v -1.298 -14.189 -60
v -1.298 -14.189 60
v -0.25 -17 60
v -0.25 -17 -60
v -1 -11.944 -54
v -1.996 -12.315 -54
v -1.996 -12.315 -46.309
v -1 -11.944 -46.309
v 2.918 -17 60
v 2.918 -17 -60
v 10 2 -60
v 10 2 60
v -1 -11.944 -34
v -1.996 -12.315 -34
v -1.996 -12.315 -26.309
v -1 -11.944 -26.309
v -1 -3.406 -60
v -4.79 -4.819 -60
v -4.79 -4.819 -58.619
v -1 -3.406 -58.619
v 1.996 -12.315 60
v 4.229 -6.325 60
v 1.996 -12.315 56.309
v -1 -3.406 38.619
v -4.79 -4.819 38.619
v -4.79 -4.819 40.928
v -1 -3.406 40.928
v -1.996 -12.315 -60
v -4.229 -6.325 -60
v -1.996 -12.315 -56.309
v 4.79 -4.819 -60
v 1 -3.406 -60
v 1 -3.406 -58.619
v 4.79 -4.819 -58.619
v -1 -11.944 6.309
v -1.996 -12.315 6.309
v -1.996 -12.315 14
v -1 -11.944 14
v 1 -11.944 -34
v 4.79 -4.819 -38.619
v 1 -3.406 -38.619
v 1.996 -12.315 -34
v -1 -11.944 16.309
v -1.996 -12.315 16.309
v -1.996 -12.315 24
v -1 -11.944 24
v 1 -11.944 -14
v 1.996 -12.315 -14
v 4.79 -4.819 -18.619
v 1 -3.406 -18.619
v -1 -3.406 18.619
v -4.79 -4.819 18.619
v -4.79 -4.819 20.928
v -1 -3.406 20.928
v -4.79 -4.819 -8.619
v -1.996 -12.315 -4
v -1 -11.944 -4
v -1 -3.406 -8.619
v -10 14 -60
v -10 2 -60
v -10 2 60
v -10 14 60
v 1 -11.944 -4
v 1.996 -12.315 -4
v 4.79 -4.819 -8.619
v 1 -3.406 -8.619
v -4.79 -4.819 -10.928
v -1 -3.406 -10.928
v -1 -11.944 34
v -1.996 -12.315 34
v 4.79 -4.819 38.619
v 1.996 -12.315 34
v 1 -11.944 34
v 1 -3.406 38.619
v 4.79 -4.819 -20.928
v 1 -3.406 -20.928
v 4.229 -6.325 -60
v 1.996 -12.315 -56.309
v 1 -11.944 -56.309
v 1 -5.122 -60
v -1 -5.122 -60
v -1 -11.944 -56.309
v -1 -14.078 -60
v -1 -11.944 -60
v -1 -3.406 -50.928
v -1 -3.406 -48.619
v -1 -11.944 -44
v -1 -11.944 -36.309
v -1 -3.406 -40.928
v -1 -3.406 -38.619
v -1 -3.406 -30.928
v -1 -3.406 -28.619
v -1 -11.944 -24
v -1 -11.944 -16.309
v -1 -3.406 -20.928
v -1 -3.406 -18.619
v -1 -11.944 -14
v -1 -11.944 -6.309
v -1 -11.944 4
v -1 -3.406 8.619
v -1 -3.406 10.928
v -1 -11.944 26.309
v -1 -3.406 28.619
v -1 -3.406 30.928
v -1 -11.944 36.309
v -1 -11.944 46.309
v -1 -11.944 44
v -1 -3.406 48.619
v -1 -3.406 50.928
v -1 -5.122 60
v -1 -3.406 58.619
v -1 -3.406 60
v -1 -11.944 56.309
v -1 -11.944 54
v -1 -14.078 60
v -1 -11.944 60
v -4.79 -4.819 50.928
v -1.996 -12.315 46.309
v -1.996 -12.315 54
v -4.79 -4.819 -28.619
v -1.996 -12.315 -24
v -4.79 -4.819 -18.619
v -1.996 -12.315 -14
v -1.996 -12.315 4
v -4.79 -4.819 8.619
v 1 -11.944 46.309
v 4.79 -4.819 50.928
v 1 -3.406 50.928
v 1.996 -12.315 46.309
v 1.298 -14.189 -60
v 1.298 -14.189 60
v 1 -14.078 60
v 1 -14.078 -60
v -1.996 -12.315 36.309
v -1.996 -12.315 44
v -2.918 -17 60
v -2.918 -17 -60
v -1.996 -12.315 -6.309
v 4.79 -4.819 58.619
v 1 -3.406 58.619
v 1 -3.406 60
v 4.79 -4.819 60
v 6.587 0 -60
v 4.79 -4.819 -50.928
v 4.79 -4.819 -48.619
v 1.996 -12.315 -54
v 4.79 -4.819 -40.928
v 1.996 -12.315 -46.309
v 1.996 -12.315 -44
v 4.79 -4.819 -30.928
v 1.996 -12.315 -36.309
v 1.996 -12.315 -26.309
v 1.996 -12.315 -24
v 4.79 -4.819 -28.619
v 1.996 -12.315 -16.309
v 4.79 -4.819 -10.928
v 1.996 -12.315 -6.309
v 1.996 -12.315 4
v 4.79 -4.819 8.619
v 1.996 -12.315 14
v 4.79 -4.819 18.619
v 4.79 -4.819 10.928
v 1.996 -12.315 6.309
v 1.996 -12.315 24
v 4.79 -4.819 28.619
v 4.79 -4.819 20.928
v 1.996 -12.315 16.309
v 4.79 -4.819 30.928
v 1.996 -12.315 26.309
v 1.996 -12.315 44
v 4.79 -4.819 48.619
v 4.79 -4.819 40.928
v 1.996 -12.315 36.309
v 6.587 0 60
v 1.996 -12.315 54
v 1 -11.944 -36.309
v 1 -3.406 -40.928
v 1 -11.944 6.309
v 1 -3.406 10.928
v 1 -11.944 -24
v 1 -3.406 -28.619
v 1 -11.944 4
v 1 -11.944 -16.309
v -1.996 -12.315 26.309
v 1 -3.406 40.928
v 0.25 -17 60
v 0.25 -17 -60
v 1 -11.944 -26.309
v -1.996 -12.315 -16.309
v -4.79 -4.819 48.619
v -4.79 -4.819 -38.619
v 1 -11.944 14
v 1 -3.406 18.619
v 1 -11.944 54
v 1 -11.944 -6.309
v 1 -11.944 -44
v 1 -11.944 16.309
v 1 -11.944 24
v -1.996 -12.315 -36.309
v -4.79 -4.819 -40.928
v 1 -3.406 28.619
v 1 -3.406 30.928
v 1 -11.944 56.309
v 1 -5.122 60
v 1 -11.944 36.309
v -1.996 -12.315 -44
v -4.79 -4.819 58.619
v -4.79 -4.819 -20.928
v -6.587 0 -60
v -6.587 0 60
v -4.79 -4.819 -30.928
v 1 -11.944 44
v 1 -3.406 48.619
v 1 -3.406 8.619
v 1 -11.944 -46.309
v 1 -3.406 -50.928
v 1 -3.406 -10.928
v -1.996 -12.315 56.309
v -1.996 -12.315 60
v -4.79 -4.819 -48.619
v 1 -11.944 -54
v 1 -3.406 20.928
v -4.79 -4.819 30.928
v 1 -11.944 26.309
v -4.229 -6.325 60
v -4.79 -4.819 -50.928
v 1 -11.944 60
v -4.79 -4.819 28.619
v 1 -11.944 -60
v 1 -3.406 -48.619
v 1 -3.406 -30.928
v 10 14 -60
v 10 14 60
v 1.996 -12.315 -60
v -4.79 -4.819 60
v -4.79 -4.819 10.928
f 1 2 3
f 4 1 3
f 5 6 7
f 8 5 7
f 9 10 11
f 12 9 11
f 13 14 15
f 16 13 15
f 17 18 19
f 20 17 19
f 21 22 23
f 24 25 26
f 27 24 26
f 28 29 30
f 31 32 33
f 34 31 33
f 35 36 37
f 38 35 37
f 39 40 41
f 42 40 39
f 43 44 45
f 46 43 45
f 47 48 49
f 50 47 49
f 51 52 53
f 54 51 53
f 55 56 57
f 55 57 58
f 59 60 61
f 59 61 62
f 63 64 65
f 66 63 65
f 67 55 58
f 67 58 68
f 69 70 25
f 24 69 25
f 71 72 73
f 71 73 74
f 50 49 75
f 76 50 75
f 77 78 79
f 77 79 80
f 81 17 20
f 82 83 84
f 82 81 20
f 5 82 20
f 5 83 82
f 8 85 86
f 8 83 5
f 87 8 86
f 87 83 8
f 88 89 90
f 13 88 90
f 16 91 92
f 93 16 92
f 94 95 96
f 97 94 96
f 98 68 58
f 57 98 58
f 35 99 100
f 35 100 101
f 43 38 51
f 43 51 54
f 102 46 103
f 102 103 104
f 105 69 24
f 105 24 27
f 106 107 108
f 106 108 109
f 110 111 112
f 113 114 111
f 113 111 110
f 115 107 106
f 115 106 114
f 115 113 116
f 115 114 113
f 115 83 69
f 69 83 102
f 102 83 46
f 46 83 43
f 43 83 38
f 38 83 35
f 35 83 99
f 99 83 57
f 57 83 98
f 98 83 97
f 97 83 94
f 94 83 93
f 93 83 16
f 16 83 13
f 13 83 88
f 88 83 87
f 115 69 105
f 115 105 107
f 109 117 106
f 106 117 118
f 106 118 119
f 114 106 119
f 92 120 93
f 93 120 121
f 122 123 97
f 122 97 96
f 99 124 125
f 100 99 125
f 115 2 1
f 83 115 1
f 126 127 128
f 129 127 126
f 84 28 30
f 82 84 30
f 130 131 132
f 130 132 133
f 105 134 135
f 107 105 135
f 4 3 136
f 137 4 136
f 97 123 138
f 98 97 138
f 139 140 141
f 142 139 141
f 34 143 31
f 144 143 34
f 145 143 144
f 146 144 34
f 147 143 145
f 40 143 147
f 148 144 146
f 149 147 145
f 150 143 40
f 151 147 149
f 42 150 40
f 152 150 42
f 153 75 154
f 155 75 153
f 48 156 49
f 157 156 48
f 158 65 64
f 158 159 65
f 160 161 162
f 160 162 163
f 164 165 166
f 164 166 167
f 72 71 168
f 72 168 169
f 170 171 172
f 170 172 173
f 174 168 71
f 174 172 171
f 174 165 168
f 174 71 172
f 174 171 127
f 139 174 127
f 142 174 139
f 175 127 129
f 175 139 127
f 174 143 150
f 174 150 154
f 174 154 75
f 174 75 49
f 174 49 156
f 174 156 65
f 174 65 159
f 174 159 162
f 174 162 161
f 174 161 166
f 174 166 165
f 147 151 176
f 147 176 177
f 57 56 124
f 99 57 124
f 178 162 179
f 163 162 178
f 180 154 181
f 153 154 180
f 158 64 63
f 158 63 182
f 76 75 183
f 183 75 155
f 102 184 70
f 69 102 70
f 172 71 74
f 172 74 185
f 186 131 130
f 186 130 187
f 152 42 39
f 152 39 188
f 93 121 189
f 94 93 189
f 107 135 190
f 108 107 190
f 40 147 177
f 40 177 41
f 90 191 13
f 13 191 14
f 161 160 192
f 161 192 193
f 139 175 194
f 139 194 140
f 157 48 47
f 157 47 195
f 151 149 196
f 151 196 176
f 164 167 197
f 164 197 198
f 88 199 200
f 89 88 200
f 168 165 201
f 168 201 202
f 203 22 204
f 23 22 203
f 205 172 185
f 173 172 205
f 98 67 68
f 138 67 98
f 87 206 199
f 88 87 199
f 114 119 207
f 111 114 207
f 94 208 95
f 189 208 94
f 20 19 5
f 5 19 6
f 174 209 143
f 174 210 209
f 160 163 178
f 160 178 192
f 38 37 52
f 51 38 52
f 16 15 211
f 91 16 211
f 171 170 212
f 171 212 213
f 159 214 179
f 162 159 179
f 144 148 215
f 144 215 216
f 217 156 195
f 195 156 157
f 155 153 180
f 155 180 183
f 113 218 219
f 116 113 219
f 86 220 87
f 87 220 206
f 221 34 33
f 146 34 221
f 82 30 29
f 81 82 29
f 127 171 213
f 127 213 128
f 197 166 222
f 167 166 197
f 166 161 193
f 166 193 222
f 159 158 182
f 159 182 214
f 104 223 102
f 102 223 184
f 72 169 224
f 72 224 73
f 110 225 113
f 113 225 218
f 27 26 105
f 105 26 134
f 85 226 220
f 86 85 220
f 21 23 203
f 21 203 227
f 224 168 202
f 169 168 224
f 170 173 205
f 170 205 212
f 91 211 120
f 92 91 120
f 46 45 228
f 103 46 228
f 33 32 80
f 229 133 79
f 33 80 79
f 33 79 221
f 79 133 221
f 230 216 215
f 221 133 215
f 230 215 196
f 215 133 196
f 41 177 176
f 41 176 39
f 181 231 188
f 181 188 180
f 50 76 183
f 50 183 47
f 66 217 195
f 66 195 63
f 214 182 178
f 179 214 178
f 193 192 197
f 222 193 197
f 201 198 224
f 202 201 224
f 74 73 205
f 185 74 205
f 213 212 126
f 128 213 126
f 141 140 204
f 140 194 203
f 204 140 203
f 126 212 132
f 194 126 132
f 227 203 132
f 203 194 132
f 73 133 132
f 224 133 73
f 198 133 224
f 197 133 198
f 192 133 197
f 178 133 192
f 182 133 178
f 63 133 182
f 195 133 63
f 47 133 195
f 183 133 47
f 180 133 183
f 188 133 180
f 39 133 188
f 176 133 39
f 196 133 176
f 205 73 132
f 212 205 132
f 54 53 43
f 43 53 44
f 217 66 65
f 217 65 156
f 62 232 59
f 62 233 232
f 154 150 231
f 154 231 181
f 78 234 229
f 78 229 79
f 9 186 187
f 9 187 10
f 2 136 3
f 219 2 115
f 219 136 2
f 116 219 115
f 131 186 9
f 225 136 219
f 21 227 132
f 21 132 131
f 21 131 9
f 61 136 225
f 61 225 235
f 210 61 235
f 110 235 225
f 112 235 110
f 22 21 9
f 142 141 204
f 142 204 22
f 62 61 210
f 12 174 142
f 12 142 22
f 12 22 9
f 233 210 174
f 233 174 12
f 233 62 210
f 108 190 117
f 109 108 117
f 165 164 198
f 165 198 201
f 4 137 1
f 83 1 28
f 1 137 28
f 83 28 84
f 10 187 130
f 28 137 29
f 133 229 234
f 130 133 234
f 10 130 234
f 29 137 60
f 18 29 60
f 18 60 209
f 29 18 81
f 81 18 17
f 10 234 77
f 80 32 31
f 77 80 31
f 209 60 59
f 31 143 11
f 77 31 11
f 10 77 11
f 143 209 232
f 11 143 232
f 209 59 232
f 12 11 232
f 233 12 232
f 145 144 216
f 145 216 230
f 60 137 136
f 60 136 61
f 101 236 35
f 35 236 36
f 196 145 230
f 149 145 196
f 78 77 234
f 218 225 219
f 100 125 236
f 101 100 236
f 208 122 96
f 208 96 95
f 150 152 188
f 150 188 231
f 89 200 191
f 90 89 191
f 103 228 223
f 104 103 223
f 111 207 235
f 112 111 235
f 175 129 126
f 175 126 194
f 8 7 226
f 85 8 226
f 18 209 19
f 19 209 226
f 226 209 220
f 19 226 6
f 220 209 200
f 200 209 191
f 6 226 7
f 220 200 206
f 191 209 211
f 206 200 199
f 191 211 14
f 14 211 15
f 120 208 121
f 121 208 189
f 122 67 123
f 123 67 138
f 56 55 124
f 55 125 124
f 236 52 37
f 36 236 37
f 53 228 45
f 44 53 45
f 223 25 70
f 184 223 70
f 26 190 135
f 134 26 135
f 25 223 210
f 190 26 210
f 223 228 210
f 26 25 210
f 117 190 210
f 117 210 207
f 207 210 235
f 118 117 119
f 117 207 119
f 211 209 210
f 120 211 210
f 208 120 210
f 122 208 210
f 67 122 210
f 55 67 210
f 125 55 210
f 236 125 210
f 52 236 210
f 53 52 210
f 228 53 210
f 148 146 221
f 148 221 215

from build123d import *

# Parameters (mm, degrees)
SALIENTE_EXTRUIR1_DEPTH = 60
SALIENTE_EXTRUIR2_REACH = 64.405


with BuildPart() as part:
    # Croquis1 → Saliente-Extruir1 (new, symmetric)
    with BuildSketch(Plane.XY):
        Polygon((-0.25, -17), (-2.91801894, -17), (-10, 2), (-10, 14), (0, 14), (0, 0), (-6.586509369, 0), align=None)
    saliente_extruir1 = extrude(amount=SALIENTE_EXTRUIR1_DEPTH, both=True)

    # Saliente-Extruir2: up to this plane
    saliente_extruir2_end = Plane(origin=(-1, 0, 0), z_dir=(1, 0, 0))
    # Croquis2 → Saliente-Extruir2 (add, up to the surface)
    with BuildSketch(Plane(origin=(-5.783057557, -2.155552847, 0), x_dir=(0, 0, -1), z_dir=(0.9370248323365327, 0.3492627429095367, 0)), mode=Mode.PRIVATE) as saliente_extruir2_sk1:
        Polygon((-60, -12.842106464), (0, -12.842106464), (0, -10.842106464), (-4, -10.842106464), (-6.309401077, -10.842106464), (-14, -10.842106464), (-16.309401077, -10.842106464), (-24, -10.842106464), (-26.309401077, -10.842106464), (-34, -10.842106464), (-36.309401077, -10.842106464), (-44, -10.842106464), (-46.309401077, -10.842106464), (-54, -10.842106464), (-56.309401077, -10.842106464), (-60, -10.842106464), align=None)
    saliente_extruir2_tool1 = split(extrude(saliente_extruir2_sk1.sketch, amount=SALIENTE_EXTRUIR2_REACH, mode=Mode.PRIVATE), bisect_by=saliente_extruir2_end, keep=Keep.BOTH, mode=Mode.PRIVATE)
    # Croquis2 → Saliente-Extruir2 (add, up to the surface)
    with BuildSketch(Plane(origin=(-5.783057557, -2.155552847, 0), x_dir=(0, 0, -1), z_dir=(0.9370248323365327, 0.3492627429095367, 0)), mode=Mode.PRIVATE) as saliente_extruir2_sk2:
        Polygon((-60, -4.449801619), (-56.309401077, -10.842106464), (-54, -10.842106464), (-58.618802154, -2.842106464), (-60, -2.842106464), align=None)
    saliente_extruir2_tool2 = split(extrude(saliente_extruir2_sk2.sketch, amount=SALIENTE_EXTRUIR2_REACH, mode=Mode.PRIVATE), bisect_by=saliente_extruir2_end, keep=Keep.BOTH, mode=Mode.PRIVATE)
    # Croquis2 → Saliente-Extruir2 (add, up to the surface)
    with BuildSketch(Plane(origin=(-5.783057557, -2.155552847, 0), x_dir=(0, 0, -1), z_dir=(0.9370248323365327, 0.3492627429095367, 0)), mode=Mode.PRIVATE) as saliente_extruir2_sk3:
        Polygon((-26.309401077, -10.842106464), (-24, -10.842106464), (-28.618802154, -2.842106464), (-30.92820323, -2.842106464), align=None)
    saliente_extruir2_tool3 = split(extrude(saliente_extruir2_sk3.sketch, amount=SALIENTE_EXTRUIR2_REACH, mode=Mode.PRIVATE), bisect_by=saliente_extruir2_end, keep=Keep.BOTH, mode=Mode.PRIVATE)
    # Croquis2 → Saliente-Extruir2 (add, up to the surface)
    with BuildSketch(Plane(origin=(-5.783057557, -2.155552847, 0), x_dir=(0, 0, -1), z_dir=(0.9370248323365327, 0.3492627429095367, 0)), mode=Mode.PRIVATE) as saliente_extruir2_sk4:
        Polygon((-16.309401077, -10.842106464), (-14, -10.842106464), (-18.618802154, -2.842106464), (-20.92820323, -2.842106464), align=None)
    saliente_extruir2_tool4 = split(extrude(saliente_extruir2_sk4.sketch, amount=SALIENTE_EXTRUIR2_REACH, mode=Mode.PRIVATE), bisect_by=saliente_extruir2_end, keep=Keep.BOTH, mode=Mode.PRIVATE)
    # Croquis2 → Saliente-Extruir2 (add, up to the surface)
    with BuildSketch(Plane(origin=(-5.783057557, -2.155552847, 0), x_dir=(0, 0, -1), z_dir=(0.9370248323365327, 0.3492627429095367, 0)), mode=Mode.PRIVATE) as saliente_extruir2_sk5:
        Polygon((28.618802154, -2.842106464), (24, -10.842106464), (26.309401077, -10.842106464), (30.92820323, -2.842106464), align=None)
    saliente_extruir2_tool5 = split(extrude(saliente_extruir2_sk5.sketch, amount=SALIENTE_EXTRUIR2_REACH, mode=Mode.PRIVATE), bisect_by=saliente_extruir2_end, keep=Keep.BOTH, mode=Mode.PRIVATE)
    # Croquis2 → Saliente-Extruir2 (add, up to the surface)
    with BuildSketch(Plane(origin=(-5.783057557, -2.155552847, 0), x_dir=(0, 0, -1), z_dir=(0.9370248323365327, 0.3492627429095367, 0)), mode=Mode.PRIVATE) as saliente_extruir2_sk6:
        Polygon((34, -10.842106464), (36.309401077, -10.842106464), (40.92820323, -2.842106464), (38.618802154, -2.842106464), align=None)
    saliente_extruir2_tool6 = split(extrude(saliente_extruir2_sk6.sketch, amount=SALIENTE_EXTRUIR2_REACH, mode=Mode.PRIVATE), bisect_by=saliente_extruir2_end, keep=Keep.BOTH, mode=Mode.PRIVATE)
    # Croquis2 → Saliente-Extruir2 (add, up to the surface)
    with BuildSketch(Plane(origin=(-5.783057557, -2.155552847, 0), x_dir=(0, 0, -1), z_dir=(0.9370248323365327, 0.3492627429095367, 0)), mode=Mode.PRIVATE) as saliente_extruir2_sk7:
        Polygon((44, -10.842106464), (46.309401077, -10.842106464), (50.92820323, -2.842106464), (48.618802154, -2.842106464), align=None)
    saliente_extruir2_tool7 = split(extrude(saliente_extruir2_sk7.sketch, amount=SALIENTE_EXTRUIR2_REACH, mode=Mode.PRIVATE), bisect_by=saliente_extruir2_end, keep=Keep.BOTH, mode=Mode.PRIVATE)
    # Croquis2 → Saliente-Extruir2 (add, up to the surface)
    with BuildSketch(Plane(origin=(-5.783057557, -2.155552847, 0), x_dir=(0, 0, -1), z_dir=(0.9370248323365327, 0.3492627429095367, 0)), mode=Mode.PRIVATE) as saliente_extruir2_sk8:
        Polygon((54, -10.842106464), (56.309401077, -10.842106464), (60, -4.449801619), (60, -2.842106464), (58.618802154, -2.842106464), align=None)
    saliente_extruir2_tool8 = split(extrude(saliente_extruir2_sk8.sketch, amount=SALIENTE_EXTRUIR2_REACH, mode=Mode.PRIVATE), bisect_by=saliente_extruir2_end, keep=Keep.BOTH, mode=Mode.PRIVATE)
    # Croquis2 → Saliente-Extruir2 (add, up to the surface)
    with BuildSketch(Plane(origin=(-5.783057557, -2.155552847, 0), x_dir=(0, 0, -1), z_dir=(0.9370248323365327, 0.3492627429095367, 0)), mode=Mode.PRIVATE) as saliente_extruir2_sk9:
        Polygon((0, -12.842106464), (60, -12.842106464), (60, -10.842106464), (56.309401077, -10.842106464), (54, -10.842106464), (46.309401077, -10.842106464), (44, -10.842106464), (36.309401077, -10.842106464), (34, -10.842106464), (26.309401077, -10.842106464), (24, -10.842106464), (16.309401077, -10.842106464), (14, -10.842106464), (6.309401077, -10.842106464), (4, -10.842106464), (0, -10.842106464), align=None)
    saliente_extruir2_tool9 = split(extrude(saliente_extruir2_sk9.sketch, amount=SALIENTE_EXTRUIR2_REACH, mode=Mode.PRIVATE), bisect_by=saliente_extruir2_end, keep=Keep.BOTH, mode=Mode.PRIVATE)
    # Croquis2 → Saliente-Extruir2 (add, up to the surface)
    with BuildSketch(Plane(origin=(-5.783057557, -2.155552847, 0), x_dir=(0, 0, -1), z_dir=(0.9370248323365327, 0.3492627429095367, 0)), mode=Mode.PRIVATE) as saliente_extruir2_sk10:
        Polygon((-44, -10.842106464), (-48.618802154, -2.842106464), (-50.92820323, -2.842106464), (-46.309401077, -10.842106464), align=None)
    saliente_extruir2_tool10 = split(extrude(saliente_extruir2_sk10.sketch, amount=SALIENTE_EXTRUIR2_REACH, mode=Mode.PRIVATE), bisect_by=saliente_extruir2_end, keep=Keep.BOTH, mode=Mode.PRIVATE)
    # Croquis2 → Saliente-Extruir2 (add, up to the surface)
    with BuildSketch(Plane(origin=(-5.783057557, -2.155552847, 0), x_dir=(0, 0, -1), z_dir=(0.9370248323365327, 0.3492627429095367, 0)), mode=Mode.PRIVATE) as saliente_extruir2_sk11:
        Polygon((-34, -10.842106464), (-38.618802154, -2.842106464), (-40.92820323, -2.842106464), (-36.309401077, -10.842106464), align=None)
    saliente_extruir2_tool11 = split(extrude(saliente_extruir2_sk11.sketch, amount=SALIENTE_EXTRUIR2_REACH, mode=Mode.PRIVATE), bisect_by=saliente_extruir2_end, keep=Keep.BOTH, mode=Mode.PRIVATE)
    # Croquis2 → Saliente-Extruir2 (add, up to the surface)
    with BuildSketch(Plane(origin=(-5.783057557, -2.155552847, 0), x_dir=(0, 0, -1), z_dir=(0.9370248323365327, 0.3492627429095367, 0)), mode=Mode.PRIVATE) as saliente_extruir2_sk12:
        Polygon((-10.92820323, -2.842106464), (-6.309401077, -10.842106464), (-4, -10.842106464), (-8.618802154, -2.842106464), align=None)
    saliente_extruir2_tool12 = split(extrude(saliente_extruir2_sk12.sketch, amount=SALIENTE_EXTRUIR2_REACH, mode=Mode.PRIVATE), bisect_by=saliente_extruir2_end, keep=Keep.BOTH, mode=Mode.PRIVATE)
    # Croquis2 → Saliente-Extruir2 (add, up to the surface)
    with BuildSketch(Plane(origin=(-5.783057557, -2.155552847, 0), x_dir=(0, 0, -1), z_dir=(0.9370248323365327, 0.3492627429095367, 0)), mode=Mode.PRIVATE) as saliente_extruir2_sk13:
        Polygon((4, -10.842106464), (8.618802154, -2.842106464), (10.92820323, -2.842106464), (6.309401077, -10.842106464), align=None)
    saliente_extruir2_tool13 = split(extrude(saliente_extruir2_sk13.sketch, amount=SALIENTE_EXTRUIR2_REACH, mode=Mode.PRIVATE), bisect_by=saliente_extruir2_end, keep=Keep.BOTH, mode=Mode.PRIVATE)
    # Croquis2 → Saliente-Extruir2 (add, up to the surface)
    with BuildSketch(Plane(origin=(-5.783057557, -2.155552847, 0), x_dir=(0, 0, -1), z_dir=(0.9370248323365327, 0.3492627429095367, 0)), mode=Mode.PRIVATE) as saliente_extruir2_sk14:
        Polygon((14, -10.842106464), (18.618802154, -2.842106464), (20.92820323, -2.842106464), (16.309401077, -10.842106464), align=None)
    saliente_extruir2_tool14 = split(extrude(saliente_extruir2_sk14.sketch, amount=SALIENTE_EXTRUIR2_REACH, mode=Mode.PRIVATE), bisect_by=saliente_extruir2_end, keep=Keep.BOTH, mode=Mode.PRIVATE)
    saliente_extruir2 = saliente_extruir2_tool1.solids().sort_by_distance((-1.647051, -13.251901, 30))[0] + saliente_extruir2_tool2.solids().sort_by_distance((-3.342446, -8.703383, 57.344356))[0] + saliente_extruir2_tool3.solids().sort_by_distance((-3.393365, -8.566777, 27.464102))[0] + saliente_extruir2_tool4.solids().sort_by_distance((-3.393365, -8.566777, 17.464102))[0] + saliente_extruir2_tool5.solids().sort_by_distance((-3.393365, -8.566777, -27.464102))[0] + saliente_extruir2_tool6.solids().sort_by_distance((-3.393365, -8.566777, -37.464102))[0] + saliente_extruir2_tool7.solids().sort_by_distance((-3.393365, -8.566777, -47.464102))[0] + saliente_extruir2_tool8.solids().sort_by_distance((-3.342446, -8.703383, -57.344356))[0] + saliente_extruir2_tool9.solids().sort_by_distance((-1.647051, -13.251901, -30))[0] + saliente_extruir2_tool10.solids().sort_by_distance((-3.393365, -8.566777, 47.464102))[0] + saliente_extruir2_tool11.solids().sort_by_distance((-3.393365, -8.566777, 37.464102))[0] + saliente_extruir2_tool12.solids().sort_by_distance((-3.393365, -8.566777, 7.464102))[0] + saliente_extruir2_tool13.solids().sort_by_distance((-3.393365, -8.566777, -7.464102))[0] + saliente_extruir2_tool14.solids().sort_by_distance((-3.393365, -8.566777, -17.464102))[0]
    add(saliente_extruir2)

    # Simetría1: Saliente-Extruir1, Saliente-Extruir2 across plane
    add(saliente_extruir1.mirror(Plane(origin=(0, 0, 0), x_dir=(0, 0, 1), z_dir=(1, 0, 0))))
    add(saliente_extruir2.mirror(Plane(origin=(0, 0, 0), x_dir=(0, 0, 1), z_dir=(1, 0, 0))))


solid = part.part
